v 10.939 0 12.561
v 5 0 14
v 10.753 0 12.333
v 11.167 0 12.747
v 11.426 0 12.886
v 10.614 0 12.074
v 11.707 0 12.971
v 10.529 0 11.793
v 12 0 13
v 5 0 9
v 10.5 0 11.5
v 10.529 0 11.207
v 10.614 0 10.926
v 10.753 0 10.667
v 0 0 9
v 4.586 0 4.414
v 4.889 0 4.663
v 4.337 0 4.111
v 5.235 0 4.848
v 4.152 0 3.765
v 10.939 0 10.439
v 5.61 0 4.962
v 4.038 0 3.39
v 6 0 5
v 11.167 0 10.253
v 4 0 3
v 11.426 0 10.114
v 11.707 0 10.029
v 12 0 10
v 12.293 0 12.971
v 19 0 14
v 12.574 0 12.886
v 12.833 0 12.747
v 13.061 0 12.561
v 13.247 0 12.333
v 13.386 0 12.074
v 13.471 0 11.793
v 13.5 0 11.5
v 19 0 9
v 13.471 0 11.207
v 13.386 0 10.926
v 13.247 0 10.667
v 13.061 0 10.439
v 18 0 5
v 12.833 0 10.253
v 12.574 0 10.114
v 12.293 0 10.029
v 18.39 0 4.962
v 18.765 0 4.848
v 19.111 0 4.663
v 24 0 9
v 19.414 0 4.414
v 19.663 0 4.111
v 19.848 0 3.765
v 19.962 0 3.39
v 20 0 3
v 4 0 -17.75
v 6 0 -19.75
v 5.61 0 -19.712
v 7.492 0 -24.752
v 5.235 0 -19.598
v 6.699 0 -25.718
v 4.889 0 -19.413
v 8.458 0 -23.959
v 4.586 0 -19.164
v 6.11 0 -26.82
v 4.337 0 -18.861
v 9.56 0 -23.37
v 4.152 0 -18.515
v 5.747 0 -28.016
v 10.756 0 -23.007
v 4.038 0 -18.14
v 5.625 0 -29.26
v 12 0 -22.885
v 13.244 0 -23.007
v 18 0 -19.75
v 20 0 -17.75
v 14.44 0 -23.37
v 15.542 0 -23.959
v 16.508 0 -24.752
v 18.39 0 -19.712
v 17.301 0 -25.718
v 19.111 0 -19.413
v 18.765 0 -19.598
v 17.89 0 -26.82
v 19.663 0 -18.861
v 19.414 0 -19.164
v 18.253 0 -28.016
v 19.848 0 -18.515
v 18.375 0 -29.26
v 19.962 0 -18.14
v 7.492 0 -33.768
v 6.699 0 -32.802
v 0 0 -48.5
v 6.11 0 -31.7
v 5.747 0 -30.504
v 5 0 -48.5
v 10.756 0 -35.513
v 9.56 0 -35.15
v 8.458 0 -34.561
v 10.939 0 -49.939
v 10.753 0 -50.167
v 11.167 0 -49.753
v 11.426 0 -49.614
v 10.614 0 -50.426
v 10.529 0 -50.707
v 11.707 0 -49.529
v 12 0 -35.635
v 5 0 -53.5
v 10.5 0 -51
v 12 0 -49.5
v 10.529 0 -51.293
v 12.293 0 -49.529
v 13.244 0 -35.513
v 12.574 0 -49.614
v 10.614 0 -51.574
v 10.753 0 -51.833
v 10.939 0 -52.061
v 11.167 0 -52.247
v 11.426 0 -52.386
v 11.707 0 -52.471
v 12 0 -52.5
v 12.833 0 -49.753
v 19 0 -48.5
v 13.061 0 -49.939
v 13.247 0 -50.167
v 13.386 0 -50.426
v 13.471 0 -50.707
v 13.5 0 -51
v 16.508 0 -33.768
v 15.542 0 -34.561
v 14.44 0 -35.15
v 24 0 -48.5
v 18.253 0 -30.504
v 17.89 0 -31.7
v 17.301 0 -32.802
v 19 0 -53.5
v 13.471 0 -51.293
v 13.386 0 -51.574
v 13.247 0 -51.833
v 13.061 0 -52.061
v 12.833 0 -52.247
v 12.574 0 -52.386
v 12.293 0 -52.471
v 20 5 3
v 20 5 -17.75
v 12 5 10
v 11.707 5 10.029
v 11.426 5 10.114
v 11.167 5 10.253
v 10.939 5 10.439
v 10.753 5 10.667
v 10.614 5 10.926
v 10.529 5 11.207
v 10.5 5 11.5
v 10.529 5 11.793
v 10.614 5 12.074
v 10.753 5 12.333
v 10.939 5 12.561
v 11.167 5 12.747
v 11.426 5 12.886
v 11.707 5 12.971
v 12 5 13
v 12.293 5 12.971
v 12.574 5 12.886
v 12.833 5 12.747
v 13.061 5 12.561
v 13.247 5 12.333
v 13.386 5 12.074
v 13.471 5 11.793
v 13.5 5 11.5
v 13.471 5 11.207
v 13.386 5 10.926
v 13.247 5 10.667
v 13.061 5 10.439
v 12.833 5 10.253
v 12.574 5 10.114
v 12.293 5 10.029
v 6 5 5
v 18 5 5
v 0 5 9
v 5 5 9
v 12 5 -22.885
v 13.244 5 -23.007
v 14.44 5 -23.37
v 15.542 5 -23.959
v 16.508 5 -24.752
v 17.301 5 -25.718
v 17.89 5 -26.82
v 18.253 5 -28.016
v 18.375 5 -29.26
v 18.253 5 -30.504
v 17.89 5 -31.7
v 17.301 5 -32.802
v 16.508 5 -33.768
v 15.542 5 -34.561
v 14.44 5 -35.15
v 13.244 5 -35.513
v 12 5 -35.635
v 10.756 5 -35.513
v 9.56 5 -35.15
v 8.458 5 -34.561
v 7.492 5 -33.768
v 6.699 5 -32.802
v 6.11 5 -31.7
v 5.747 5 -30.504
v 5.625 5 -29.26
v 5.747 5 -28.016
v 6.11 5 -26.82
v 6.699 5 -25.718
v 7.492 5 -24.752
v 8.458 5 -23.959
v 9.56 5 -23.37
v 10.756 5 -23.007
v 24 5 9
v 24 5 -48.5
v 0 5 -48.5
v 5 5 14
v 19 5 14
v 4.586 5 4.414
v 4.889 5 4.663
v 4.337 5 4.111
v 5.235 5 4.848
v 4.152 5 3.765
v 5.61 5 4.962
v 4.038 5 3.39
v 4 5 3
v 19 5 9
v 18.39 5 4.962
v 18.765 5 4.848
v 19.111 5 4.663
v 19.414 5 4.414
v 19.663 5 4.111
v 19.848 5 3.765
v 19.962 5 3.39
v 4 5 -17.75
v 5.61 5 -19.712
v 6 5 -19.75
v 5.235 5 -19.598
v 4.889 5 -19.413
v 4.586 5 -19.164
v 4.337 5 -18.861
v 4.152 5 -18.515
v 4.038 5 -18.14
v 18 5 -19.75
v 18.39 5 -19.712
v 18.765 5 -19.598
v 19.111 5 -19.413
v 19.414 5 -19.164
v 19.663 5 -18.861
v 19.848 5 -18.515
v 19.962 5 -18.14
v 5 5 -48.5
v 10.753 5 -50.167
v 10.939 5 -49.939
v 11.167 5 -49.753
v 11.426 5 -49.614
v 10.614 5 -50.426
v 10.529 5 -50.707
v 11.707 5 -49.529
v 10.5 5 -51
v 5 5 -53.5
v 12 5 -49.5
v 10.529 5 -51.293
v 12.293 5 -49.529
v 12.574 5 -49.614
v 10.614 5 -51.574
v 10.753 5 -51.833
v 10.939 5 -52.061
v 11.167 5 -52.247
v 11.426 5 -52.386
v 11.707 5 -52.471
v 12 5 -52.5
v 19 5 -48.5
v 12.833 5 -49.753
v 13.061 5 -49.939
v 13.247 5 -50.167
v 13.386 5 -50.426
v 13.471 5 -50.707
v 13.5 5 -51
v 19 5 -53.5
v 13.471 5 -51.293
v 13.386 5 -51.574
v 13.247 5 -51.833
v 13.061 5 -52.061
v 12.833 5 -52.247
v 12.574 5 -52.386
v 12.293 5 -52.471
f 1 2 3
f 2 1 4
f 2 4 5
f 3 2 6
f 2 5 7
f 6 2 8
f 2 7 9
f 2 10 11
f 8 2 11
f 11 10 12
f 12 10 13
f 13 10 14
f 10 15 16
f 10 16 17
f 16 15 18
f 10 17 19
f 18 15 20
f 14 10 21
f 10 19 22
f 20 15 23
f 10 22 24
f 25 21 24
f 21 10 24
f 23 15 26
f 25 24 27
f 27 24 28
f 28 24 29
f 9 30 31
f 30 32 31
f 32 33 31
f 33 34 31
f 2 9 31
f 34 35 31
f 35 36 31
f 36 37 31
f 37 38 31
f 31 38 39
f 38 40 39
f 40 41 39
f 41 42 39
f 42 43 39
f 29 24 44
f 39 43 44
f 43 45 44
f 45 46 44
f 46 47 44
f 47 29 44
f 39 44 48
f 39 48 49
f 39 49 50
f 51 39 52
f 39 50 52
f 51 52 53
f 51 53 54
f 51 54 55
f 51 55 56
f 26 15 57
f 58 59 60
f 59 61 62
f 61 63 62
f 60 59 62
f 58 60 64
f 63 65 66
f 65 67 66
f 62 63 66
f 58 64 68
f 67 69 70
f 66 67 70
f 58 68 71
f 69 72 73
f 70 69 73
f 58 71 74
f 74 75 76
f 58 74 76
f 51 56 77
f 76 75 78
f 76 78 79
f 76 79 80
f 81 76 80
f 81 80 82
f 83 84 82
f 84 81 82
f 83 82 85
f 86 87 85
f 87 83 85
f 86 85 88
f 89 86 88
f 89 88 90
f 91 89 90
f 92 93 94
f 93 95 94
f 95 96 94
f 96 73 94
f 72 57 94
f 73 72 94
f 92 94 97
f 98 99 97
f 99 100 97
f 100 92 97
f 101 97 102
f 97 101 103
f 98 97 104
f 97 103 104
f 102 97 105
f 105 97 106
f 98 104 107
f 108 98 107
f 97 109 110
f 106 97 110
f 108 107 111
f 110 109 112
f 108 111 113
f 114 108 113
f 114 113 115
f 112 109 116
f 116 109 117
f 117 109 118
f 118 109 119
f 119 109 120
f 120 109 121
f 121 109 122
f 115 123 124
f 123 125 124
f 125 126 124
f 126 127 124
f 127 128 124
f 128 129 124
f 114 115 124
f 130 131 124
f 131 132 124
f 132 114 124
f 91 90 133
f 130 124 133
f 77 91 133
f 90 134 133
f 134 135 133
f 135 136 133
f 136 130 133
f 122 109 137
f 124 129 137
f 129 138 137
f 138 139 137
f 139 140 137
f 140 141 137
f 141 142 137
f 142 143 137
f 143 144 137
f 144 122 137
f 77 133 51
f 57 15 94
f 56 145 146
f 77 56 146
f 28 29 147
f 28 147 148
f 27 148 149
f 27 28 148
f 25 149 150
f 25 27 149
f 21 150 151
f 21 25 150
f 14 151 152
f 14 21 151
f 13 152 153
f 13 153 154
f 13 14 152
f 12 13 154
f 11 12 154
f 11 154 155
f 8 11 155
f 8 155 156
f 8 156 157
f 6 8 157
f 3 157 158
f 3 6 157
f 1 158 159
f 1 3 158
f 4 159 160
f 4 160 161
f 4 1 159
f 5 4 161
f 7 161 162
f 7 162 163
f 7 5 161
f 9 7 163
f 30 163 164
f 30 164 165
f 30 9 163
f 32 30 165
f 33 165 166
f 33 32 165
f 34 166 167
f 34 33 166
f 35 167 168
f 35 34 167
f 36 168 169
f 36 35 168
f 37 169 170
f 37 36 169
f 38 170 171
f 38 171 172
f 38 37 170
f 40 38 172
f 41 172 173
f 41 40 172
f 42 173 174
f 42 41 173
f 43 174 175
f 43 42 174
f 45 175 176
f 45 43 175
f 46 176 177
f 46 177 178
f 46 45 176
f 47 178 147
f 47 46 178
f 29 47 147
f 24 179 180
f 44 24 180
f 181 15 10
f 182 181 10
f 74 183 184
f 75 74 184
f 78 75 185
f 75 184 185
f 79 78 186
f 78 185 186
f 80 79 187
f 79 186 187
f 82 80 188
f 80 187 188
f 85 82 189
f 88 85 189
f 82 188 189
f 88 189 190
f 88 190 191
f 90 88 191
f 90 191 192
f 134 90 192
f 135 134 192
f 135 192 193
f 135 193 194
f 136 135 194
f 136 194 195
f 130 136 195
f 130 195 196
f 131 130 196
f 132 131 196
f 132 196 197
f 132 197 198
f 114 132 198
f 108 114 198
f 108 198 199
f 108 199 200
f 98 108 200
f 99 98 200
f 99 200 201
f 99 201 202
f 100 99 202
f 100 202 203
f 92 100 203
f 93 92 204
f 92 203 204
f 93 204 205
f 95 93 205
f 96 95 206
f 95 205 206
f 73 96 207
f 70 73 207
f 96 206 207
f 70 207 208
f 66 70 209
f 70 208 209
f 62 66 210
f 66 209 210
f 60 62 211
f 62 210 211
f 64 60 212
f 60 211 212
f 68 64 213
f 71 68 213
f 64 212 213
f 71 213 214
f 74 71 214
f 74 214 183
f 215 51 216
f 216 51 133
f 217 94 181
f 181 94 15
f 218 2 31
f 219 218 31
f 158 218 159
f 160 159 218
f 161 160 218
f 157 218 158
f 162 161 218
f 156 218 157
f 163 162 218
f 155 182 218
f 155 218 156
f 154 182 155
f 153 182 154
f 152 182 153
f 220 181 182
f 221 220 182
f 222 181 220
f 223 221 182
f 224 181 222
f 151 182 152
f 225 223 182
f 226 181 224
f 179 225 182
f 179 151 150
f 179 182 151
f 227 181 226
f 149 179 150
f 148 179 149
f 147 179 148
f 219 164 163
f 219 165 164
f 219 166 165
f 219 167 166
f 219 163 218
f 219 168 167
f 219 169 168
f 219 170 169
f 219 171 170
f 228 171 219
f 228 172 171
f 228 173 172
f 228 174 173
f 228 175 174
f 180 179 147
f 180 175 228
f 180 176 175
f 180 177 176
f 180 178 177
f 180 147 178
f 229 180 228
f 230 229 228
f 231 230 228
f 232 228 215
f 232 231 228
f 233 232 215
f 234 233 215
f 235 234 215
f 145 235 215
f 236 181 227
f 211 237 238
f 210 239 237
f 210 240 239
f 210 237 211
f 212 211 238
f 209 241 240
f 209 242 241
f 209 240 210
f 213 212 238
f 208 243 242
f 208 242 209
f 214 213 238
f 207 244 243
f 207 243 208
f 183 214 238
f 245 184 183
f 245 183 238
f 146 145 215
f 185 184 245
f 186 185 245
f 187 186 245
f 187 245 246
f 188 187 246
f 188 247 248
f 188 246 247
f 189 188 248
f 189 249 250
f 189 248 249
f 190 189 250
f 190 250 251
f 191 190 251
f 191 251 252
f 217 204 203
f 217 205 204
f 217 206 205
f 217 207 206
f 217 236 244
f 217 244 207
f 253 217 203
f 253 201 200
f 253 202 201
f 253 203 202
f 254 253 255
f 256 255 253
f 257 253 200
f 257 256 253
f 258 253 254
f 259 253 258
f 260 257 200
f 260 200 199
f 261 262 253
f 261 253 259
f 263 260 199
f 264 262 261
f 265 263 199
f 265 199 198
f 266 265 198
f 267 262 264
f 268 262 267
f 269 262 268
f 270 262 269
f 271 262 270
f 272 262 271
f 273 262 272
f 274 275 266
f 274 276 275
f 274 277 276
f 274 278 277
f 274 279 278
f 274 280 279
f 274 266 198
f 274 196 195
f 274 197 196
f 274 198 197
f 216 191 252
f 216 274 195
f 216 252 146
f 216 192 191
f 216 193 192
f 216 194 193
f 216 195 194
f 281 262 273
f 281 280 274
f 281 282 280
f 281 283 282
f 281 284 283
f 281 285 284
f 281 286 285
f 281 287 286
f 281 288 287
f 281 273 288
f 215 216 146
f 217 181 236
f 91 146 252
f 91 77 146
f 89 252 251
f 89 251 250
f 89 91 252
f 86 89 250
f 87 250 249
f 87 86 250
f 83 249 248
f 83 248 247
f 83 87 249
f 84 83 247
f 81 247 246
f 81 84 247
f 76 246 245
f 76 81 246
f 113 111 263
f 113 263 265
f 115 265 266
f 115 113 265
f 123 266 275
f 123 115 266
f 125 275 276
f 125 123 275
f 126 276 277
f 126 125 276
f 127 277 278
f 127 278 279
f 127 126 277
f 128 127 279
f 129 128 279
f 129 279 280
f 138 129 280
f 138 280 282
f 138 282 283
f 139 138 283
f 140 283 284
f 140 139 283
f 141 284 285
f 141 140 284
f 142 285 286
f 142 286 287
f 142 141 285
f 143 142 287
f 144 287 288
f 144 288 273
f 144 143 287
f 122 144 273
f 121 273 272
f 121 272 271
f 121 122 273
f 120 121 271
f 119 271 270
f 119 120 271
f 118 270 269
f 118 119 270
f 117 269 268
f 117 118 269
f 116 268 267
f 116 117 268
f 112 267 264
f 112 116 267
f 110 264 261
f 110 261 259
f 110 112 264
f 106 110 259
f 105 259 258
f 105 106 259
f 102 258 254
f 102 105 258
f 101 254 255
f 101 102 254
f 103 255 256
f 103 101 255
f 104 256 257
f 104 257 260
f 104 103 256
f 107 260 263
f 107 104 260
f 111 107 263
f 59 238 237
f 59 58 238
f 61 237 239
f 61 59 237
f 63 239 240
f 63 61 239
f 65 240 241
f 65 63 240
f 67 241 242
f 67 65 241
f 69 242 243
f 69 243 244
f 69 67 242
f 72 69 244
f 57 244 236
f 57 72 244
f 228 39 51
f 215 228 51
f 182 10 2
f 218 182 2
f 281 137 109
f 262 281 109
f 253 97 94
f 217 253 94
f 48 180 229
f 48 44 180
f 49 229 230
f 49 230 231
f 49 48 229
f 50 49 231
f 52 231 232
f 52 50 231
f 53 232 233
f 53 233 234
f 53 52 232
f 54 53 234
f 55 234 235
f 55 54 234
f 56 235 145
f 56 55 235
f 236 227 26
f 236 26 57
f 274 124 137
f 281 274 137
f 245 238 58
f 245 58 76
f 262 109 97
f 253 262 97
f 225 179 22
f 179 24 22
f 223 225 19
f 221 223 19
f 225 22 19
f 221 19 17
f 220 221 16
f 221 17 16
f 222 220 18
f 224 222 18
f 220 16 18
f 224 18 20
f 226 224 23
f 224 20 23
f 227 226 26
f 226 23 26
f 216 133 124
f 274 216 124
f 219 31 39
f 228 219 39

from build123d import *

# Parameters (mm, degrees)
SKETCH1_R           = 1.5
BOSS_EXTRUDE1_DEPTH = 5
SKETCH2_R           = 6.375
CUT_EXTRUDE1_DEPTH  = 10
SKETCH3_W           = 16
SKETCH3_H           = 24.75
CUT_EXTRUDE2_DEPTH  = 10
FILLET1_R           = 2


with BuildPart() as part:
    # Sketch1 → Boss-Extrude1 (new body)
    with BuildSketch(Plane(origin=(0, 0, 0), x_dir=(1, 0, 0), z_dir=(0, 1, 0))):
        Polygon((5, -14), (19, -14), (19, -9), (24, -9), (24, 48.5), (19, 48.5), (19, 53.5), (5, 53.5), (5, 48.5), (0, 48.5), (0, -9), (5, -9), align=None)
        with Locations(Location((12, 51, 0), (0, 0, 270))):
            Circle(SKETCH1_R, mode=Mode.SUBTRACT)
        with Locations(Location((12, -11.5, 0), (0, 0, 90))):
            Circle(SKETCH1_R, mode=Mode.SUBTRACT)
    extrude(amount=BOSS_EXTRUDE1_DEPTH)

    # Sketch2 → Cut-Extrude1 (cut)
    with BuildSketch(Plane(origin=(0, 5, 0), x_dir=(1, 0, 0), z_dir=(0, 1, 0))):
        with Locations(Location((12, 29.26, 0), (0, 0, 270))):
            Circle(SKETCH2_R)
    extrude(amount=-CUT_EXTRUDE1_DEPTH, mode=Mode.SUBTRACT)

    # Sketch3 → Cut-Extrude2 (cut)
    with BuildSketch(Plane(origin=(0, 5, 0), x_dir=(1, 0, 0), z_dir=(0, 1, 0))):
        with Locations((12, 7.375)):
            Rectangle(SKETCH3_W, SKETCH3_H)
    extrude(amount=-CUT_EXTRUDE2_DEPTH, mode=Mode.SUBTRACT)

    # Fillet1
    fillet1_edges = [part.edges().sort_by_distance(p)[0] for p in [
        (20, 2.5, 5),
        (4, 2.5, 5),
        (4, 2.5, -19.75),
        (20, 2.5, -19.75),
    ]]
    fillet(fillet1_edges, radius=FILLET1_R)


solid = part.part
